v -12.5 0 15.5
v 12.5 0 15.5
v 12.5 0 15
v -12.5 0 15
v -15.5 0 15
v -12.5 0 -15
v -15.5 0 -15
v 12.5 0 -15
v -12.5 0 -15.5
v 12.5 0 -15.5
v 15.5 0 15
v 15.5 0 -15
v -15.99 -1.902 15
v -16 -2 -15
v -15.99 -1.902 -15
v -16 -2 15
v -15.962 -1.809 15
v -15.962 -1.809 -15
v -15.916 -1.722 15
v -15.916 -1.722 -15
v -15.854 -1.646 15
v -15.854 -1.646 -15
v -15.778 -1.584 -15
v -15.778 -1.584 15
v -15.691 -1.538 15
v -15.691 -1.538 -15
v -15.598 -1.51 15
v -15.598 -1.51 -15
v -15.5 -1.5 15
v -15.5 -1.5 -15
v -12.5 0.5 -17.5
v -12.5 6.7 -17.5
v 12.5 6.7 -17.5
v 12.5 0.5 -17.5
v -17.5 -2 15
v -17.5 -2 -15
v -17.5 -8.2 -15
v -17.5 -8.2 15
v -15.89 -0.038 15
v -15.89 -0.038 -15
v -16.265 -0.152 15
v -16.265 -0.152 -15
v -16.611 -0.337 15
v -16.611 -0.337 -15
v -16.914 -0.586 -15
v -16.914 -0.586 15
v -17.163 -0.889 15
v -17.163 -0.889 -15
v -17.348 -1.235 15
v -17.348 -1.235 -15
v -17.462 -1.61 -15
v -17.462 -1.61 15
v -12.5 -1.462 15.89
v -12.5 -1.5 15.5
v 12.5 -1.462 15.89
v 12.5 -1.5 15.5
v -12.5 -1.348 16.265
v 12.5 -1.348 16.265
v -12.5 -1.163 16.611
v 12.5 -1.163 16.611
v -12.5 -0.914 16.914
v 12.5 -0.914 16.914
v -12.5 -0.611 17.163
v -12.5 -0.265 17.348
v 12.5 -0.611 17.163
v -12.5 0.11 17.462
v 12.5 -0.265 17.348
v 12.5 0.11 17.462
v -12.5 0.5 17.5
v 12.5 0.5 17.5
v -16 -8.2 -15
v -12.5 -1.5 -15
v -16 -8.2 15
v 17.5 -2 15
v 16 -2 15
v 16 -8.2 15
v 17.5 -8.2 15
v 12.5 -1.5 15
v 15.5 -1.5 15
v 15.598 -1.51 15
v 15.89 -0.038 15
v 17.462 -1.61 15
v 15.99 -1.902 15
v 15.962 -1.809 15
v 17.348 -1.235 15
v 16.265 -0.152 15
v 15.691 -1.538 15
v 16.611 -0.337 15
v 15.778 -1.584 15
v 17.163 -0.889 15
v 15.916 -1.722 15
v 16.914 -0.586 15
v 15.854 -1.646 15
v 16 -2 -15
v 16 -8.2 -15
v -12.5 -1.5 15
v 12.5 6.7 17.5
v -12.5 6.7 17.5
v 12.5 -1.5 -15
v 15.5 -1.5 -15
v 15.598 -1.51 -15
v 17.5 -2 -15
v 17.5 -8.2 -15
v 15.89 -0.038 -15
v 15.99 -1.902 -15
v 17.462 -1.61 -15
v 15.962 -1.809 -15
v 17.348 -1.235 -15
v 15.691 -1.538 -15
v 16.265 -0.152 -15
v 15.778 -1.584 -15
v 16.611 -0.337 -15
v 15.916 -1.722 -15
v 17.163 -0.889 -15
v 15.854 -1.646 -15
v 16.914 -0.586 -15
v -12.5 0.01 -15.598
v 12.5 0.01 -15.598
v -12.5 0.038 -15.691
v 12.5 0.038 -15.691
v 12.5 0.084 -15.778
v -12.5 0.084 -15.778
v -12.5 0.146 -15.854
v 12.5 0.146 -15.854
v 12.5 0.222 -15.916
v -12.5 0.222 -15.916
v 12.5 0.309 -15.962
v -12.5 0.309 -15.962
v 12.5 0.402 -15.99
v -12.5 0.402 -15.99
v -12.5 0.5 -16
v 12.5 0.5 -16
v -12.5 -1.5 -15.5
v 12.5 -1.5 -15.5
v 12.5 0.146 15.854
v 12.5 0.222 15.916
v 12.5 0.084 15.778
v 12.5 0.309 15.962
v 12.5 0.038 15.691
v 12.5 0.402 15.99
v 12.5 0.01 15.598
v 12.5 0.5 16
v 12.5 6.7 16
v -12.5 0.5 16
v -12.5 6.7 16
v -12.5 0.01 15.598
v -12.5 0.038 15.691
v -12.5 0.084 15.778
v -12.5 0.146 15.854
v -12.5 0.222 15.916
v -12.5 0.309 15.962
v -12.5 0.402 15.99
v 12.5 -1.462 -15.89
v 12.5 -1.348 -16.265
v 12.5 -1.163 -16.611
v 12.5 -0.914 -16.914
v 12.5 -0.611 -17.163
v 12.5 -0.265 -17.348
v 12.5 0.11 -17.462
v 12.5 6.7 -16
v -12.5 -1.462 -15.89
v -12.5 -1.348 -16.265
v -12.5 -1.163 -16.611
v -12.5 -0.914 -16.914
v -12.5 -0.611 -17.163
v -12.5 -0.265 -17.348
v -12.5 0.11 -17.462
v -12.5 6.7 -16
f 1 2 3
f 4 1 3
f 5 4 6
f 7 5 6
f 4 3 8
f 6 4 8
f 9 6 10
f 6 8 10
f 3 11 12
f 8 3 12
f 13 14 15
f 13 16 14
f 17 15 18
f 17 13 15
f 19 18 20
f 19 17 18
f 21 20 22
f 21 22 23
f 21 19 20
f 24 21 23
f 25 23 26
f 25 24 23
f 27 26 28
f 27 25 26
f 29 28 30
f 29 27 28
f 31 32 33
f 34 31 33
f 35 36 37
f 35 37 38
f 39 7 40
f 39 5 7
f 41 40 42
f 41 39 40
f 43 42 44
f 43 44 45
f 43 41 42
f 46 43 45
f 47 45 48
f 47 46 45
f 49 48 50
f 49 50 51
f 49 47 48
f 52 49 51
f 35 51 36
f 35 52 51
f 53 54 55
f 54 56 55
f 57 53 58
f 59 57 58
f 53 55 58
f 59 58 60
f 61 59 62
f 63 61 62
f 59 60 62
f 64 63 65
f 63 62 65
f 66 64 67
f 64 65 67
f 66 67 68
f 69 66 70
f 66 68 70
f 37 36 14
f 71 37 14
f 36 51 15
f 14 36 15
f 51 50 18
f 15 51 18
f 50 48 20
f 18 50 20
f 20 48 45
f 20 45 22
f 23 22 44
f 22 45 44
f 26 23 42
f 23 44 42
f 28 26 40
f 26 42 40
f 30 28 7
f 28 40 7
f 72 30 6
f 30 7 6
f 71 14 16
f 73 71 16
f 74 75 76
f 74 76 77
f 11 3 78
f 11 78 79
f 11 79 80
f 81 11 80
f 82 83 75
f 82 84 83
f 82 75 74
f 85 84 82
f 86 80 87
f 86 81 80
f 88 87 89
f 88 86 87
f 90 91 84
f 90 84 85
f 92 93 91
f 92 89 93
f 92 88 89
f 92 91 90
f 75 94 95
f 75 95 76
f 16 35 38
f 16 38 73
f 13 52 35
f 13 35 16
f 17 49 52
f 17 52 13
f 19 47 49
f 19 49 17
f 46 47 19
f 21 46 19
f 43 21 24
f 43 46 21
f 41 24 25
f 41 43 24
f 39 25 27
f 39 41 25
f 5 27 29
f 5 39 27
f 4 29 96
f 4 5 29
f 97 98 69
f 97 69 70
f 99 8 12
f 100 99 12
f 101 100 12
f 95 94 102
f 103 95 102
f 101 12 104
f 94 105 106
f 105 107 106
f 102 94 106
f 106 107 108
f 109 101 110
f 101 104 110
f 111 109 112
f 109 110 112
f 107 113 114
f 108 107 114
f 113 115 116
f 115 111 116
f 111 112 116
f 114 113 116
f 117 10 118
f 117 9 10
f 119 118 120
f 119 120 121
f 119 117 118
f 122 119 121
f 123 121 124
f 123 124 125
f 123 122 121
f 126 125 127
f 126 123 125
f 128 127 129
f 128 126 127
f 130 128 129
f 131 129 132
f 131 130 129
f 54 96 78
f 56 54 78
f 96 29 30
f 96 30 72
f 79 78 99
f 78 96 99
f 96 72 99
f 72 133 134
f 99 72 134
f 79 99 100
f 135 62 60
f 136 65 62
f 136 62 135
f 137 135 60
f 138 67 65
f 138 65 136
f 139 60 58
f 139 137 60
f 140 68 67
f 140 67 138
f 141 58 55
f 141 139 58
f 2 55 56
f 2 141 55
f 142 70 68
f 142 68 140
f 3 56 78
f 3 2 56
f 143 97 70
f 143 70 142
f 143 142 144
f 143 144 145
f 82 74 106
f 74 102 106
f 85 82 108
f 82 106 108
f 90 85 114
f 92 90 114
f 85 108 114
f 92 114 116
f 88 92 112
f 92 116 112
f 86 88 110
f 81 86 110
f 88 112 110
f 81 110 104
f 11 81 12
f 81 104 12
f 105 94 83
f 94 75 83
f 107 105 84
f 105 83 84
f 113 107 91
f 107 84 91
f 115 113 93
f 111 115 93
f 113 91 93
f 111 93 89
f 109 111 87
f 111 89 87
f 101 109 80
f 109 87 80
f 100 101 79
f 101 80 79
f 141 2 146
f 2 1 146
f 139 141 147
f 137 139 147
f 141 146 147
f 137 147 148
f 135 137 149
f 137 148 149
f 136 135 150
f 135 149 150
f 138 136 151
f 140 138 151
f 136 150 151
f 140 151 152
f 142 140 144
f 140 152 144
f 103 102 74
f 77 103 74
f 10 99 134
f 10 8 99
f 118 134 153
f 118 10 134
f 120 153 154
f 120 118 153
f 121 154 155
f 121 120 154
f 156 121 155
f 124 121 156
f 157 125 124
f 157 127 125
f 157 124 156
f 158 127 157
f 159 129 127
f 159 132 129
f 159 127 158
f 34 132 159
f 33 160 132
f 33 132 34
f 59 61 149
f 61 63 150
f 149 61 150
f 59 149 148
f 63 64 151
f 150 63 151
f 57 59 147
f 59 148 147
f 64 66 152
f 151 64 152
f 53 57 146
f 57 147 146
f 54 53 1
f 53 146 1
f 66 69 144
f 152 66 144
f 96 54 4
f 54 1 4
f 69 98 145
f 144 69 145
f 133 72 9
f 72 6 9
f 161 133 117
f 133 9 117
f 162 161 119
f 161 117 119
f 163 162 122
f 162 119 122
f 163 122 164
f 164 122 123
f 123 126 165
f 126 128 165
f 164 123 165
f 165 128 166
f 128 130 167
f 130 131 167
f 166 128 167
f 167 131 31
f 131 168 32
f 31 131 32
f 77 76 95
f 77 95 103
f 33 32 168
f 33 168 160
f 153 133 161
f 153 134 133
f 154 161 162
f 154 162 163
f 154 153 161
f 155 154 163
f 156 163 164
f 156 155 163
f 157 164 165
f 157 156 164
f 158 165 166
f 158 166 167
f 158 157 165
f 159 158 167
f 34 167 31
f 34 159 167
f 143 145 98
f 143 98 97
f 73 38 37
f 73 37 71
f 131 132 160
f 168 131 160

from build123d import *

# Parameters (mm, degrees)
SKETCH1_W           = 25
SKETCH1_H           = 35
BOSS_EXTRUDE1_DEPTH = 8.2
SKETCH2_W           = 32
SKETCH2_H           = 6.7
CUT_EXTRUDE1_DEPTH  = 26
SKETCH3_W           = 30
SKETCH3_H           = 1.5
BOSS_EXTRUDE2_DEPTH = 5
SKETCH4_W           = 1.5
SKETCH4_H           = 30
BOSS_EXTRUDE3_DEPTH = 6.7
SKETCH5_W           = 30
SKETCH5_H           = 1.5
BOSS_EXTRUDE4_DEPTH = 5
SKETCH6_W           = 1.5
SKETCH6_H           = 30
BOSS_EXTRUDE5_DEPTH = 6.7
FILLET1_R           = 0.5
FILLET2_R           = 2


with BuildPart() as part:
    # Sketch1 → Boss-Extrude1 (new body)
    with BuildSketch(Plane(origin=(0, 6.7, 0), x_dir=(1, 0, 0), z_dir=(0, 1, 0))):
        Rectangle(SKETCH1_W, SKETCH1_H)
    extrude(amount=-BOSS_EXTRUDE1_DEPTH)

    # Sketch2 → Cut-Extrude1 (cut, through all)
    with BuildSketch(Plane(origin=(12.5, 0, 0), x_dir=(0, 0, -1), z_dir=(1, 0, 0))):
        with Locations((0, 3.35)):
            Rectangle(SKETCH2_W, SKETCH2_H)
    extrude(amount=-CUT_EXTRUDE1_DEPTH, mode=Mode.SUBTRACT)

    # Sketch3 → Boss-Extrude2 (add)
    with BuildSketch(Plane.ZY.offset(12.5)):
        with Locations((0, -0.75)):
            Rectangle(SKETCH3_W, SKETCH3_H)
    extrude(amount=BOSS_EXTRUDE2_DEPTH)

    # Sketch4 → Boss-Extrude3 (add)
    with BuildSketch(Plane.XZ.offset(1.5)):
        with Locations((-16.75, 0)):
            Rectangle(SKETCH4_W, SKETCH4_H)
    extrude(amount=BOSS_EXTRUDE3_DEPTH)

    # Sketch5 → Boss-Extrude4 (add)
    with BuildSketch(Plane(origin=(12.5, 0, 0), x_dir=(0, 0, -1), z_dir=(1, 0, 0))):
        with Locations((0, -0.75)):
            Rectangle(SKETCH5_W, SKETCH5_H)
    extrude(amount=BOSS_EXTRUDE4_DEPTH)

    # Sketch6 → Boss-Extrude5 (add)
    with BuildSketch(Plane.XZ.offset(1.5)):
        with Locations((16.75, 0)):
            Rectangle(SKETCH6_W, SKETCH6_H)
    extrude(amount=BOSS_EXTRUDE5_DEPTH)

    # Fillet1
    fillet1_edges = [part.edges().sort_by_distance(p)[0] for p in [
        (0, 0, -16),
        (0, 0, 16),
        (-16, -1.5, 0),
        (16, -1.5, 0),
    ]]
    fillet(fillet1_edges, radius=FILLET1_R)

    # Fillet2
    fillet2_edges = [part.edges().sort_by_distance(p)[0] for p in [
        (0, -1.5, -17.5),
        (-17.5, 0, 0),
        (0, -1.5, 17.5),
        (17.5, 0, 0),
    ]]
    fillet(fillet2_edges, radius=FILLET2_R)


solid = part.part
